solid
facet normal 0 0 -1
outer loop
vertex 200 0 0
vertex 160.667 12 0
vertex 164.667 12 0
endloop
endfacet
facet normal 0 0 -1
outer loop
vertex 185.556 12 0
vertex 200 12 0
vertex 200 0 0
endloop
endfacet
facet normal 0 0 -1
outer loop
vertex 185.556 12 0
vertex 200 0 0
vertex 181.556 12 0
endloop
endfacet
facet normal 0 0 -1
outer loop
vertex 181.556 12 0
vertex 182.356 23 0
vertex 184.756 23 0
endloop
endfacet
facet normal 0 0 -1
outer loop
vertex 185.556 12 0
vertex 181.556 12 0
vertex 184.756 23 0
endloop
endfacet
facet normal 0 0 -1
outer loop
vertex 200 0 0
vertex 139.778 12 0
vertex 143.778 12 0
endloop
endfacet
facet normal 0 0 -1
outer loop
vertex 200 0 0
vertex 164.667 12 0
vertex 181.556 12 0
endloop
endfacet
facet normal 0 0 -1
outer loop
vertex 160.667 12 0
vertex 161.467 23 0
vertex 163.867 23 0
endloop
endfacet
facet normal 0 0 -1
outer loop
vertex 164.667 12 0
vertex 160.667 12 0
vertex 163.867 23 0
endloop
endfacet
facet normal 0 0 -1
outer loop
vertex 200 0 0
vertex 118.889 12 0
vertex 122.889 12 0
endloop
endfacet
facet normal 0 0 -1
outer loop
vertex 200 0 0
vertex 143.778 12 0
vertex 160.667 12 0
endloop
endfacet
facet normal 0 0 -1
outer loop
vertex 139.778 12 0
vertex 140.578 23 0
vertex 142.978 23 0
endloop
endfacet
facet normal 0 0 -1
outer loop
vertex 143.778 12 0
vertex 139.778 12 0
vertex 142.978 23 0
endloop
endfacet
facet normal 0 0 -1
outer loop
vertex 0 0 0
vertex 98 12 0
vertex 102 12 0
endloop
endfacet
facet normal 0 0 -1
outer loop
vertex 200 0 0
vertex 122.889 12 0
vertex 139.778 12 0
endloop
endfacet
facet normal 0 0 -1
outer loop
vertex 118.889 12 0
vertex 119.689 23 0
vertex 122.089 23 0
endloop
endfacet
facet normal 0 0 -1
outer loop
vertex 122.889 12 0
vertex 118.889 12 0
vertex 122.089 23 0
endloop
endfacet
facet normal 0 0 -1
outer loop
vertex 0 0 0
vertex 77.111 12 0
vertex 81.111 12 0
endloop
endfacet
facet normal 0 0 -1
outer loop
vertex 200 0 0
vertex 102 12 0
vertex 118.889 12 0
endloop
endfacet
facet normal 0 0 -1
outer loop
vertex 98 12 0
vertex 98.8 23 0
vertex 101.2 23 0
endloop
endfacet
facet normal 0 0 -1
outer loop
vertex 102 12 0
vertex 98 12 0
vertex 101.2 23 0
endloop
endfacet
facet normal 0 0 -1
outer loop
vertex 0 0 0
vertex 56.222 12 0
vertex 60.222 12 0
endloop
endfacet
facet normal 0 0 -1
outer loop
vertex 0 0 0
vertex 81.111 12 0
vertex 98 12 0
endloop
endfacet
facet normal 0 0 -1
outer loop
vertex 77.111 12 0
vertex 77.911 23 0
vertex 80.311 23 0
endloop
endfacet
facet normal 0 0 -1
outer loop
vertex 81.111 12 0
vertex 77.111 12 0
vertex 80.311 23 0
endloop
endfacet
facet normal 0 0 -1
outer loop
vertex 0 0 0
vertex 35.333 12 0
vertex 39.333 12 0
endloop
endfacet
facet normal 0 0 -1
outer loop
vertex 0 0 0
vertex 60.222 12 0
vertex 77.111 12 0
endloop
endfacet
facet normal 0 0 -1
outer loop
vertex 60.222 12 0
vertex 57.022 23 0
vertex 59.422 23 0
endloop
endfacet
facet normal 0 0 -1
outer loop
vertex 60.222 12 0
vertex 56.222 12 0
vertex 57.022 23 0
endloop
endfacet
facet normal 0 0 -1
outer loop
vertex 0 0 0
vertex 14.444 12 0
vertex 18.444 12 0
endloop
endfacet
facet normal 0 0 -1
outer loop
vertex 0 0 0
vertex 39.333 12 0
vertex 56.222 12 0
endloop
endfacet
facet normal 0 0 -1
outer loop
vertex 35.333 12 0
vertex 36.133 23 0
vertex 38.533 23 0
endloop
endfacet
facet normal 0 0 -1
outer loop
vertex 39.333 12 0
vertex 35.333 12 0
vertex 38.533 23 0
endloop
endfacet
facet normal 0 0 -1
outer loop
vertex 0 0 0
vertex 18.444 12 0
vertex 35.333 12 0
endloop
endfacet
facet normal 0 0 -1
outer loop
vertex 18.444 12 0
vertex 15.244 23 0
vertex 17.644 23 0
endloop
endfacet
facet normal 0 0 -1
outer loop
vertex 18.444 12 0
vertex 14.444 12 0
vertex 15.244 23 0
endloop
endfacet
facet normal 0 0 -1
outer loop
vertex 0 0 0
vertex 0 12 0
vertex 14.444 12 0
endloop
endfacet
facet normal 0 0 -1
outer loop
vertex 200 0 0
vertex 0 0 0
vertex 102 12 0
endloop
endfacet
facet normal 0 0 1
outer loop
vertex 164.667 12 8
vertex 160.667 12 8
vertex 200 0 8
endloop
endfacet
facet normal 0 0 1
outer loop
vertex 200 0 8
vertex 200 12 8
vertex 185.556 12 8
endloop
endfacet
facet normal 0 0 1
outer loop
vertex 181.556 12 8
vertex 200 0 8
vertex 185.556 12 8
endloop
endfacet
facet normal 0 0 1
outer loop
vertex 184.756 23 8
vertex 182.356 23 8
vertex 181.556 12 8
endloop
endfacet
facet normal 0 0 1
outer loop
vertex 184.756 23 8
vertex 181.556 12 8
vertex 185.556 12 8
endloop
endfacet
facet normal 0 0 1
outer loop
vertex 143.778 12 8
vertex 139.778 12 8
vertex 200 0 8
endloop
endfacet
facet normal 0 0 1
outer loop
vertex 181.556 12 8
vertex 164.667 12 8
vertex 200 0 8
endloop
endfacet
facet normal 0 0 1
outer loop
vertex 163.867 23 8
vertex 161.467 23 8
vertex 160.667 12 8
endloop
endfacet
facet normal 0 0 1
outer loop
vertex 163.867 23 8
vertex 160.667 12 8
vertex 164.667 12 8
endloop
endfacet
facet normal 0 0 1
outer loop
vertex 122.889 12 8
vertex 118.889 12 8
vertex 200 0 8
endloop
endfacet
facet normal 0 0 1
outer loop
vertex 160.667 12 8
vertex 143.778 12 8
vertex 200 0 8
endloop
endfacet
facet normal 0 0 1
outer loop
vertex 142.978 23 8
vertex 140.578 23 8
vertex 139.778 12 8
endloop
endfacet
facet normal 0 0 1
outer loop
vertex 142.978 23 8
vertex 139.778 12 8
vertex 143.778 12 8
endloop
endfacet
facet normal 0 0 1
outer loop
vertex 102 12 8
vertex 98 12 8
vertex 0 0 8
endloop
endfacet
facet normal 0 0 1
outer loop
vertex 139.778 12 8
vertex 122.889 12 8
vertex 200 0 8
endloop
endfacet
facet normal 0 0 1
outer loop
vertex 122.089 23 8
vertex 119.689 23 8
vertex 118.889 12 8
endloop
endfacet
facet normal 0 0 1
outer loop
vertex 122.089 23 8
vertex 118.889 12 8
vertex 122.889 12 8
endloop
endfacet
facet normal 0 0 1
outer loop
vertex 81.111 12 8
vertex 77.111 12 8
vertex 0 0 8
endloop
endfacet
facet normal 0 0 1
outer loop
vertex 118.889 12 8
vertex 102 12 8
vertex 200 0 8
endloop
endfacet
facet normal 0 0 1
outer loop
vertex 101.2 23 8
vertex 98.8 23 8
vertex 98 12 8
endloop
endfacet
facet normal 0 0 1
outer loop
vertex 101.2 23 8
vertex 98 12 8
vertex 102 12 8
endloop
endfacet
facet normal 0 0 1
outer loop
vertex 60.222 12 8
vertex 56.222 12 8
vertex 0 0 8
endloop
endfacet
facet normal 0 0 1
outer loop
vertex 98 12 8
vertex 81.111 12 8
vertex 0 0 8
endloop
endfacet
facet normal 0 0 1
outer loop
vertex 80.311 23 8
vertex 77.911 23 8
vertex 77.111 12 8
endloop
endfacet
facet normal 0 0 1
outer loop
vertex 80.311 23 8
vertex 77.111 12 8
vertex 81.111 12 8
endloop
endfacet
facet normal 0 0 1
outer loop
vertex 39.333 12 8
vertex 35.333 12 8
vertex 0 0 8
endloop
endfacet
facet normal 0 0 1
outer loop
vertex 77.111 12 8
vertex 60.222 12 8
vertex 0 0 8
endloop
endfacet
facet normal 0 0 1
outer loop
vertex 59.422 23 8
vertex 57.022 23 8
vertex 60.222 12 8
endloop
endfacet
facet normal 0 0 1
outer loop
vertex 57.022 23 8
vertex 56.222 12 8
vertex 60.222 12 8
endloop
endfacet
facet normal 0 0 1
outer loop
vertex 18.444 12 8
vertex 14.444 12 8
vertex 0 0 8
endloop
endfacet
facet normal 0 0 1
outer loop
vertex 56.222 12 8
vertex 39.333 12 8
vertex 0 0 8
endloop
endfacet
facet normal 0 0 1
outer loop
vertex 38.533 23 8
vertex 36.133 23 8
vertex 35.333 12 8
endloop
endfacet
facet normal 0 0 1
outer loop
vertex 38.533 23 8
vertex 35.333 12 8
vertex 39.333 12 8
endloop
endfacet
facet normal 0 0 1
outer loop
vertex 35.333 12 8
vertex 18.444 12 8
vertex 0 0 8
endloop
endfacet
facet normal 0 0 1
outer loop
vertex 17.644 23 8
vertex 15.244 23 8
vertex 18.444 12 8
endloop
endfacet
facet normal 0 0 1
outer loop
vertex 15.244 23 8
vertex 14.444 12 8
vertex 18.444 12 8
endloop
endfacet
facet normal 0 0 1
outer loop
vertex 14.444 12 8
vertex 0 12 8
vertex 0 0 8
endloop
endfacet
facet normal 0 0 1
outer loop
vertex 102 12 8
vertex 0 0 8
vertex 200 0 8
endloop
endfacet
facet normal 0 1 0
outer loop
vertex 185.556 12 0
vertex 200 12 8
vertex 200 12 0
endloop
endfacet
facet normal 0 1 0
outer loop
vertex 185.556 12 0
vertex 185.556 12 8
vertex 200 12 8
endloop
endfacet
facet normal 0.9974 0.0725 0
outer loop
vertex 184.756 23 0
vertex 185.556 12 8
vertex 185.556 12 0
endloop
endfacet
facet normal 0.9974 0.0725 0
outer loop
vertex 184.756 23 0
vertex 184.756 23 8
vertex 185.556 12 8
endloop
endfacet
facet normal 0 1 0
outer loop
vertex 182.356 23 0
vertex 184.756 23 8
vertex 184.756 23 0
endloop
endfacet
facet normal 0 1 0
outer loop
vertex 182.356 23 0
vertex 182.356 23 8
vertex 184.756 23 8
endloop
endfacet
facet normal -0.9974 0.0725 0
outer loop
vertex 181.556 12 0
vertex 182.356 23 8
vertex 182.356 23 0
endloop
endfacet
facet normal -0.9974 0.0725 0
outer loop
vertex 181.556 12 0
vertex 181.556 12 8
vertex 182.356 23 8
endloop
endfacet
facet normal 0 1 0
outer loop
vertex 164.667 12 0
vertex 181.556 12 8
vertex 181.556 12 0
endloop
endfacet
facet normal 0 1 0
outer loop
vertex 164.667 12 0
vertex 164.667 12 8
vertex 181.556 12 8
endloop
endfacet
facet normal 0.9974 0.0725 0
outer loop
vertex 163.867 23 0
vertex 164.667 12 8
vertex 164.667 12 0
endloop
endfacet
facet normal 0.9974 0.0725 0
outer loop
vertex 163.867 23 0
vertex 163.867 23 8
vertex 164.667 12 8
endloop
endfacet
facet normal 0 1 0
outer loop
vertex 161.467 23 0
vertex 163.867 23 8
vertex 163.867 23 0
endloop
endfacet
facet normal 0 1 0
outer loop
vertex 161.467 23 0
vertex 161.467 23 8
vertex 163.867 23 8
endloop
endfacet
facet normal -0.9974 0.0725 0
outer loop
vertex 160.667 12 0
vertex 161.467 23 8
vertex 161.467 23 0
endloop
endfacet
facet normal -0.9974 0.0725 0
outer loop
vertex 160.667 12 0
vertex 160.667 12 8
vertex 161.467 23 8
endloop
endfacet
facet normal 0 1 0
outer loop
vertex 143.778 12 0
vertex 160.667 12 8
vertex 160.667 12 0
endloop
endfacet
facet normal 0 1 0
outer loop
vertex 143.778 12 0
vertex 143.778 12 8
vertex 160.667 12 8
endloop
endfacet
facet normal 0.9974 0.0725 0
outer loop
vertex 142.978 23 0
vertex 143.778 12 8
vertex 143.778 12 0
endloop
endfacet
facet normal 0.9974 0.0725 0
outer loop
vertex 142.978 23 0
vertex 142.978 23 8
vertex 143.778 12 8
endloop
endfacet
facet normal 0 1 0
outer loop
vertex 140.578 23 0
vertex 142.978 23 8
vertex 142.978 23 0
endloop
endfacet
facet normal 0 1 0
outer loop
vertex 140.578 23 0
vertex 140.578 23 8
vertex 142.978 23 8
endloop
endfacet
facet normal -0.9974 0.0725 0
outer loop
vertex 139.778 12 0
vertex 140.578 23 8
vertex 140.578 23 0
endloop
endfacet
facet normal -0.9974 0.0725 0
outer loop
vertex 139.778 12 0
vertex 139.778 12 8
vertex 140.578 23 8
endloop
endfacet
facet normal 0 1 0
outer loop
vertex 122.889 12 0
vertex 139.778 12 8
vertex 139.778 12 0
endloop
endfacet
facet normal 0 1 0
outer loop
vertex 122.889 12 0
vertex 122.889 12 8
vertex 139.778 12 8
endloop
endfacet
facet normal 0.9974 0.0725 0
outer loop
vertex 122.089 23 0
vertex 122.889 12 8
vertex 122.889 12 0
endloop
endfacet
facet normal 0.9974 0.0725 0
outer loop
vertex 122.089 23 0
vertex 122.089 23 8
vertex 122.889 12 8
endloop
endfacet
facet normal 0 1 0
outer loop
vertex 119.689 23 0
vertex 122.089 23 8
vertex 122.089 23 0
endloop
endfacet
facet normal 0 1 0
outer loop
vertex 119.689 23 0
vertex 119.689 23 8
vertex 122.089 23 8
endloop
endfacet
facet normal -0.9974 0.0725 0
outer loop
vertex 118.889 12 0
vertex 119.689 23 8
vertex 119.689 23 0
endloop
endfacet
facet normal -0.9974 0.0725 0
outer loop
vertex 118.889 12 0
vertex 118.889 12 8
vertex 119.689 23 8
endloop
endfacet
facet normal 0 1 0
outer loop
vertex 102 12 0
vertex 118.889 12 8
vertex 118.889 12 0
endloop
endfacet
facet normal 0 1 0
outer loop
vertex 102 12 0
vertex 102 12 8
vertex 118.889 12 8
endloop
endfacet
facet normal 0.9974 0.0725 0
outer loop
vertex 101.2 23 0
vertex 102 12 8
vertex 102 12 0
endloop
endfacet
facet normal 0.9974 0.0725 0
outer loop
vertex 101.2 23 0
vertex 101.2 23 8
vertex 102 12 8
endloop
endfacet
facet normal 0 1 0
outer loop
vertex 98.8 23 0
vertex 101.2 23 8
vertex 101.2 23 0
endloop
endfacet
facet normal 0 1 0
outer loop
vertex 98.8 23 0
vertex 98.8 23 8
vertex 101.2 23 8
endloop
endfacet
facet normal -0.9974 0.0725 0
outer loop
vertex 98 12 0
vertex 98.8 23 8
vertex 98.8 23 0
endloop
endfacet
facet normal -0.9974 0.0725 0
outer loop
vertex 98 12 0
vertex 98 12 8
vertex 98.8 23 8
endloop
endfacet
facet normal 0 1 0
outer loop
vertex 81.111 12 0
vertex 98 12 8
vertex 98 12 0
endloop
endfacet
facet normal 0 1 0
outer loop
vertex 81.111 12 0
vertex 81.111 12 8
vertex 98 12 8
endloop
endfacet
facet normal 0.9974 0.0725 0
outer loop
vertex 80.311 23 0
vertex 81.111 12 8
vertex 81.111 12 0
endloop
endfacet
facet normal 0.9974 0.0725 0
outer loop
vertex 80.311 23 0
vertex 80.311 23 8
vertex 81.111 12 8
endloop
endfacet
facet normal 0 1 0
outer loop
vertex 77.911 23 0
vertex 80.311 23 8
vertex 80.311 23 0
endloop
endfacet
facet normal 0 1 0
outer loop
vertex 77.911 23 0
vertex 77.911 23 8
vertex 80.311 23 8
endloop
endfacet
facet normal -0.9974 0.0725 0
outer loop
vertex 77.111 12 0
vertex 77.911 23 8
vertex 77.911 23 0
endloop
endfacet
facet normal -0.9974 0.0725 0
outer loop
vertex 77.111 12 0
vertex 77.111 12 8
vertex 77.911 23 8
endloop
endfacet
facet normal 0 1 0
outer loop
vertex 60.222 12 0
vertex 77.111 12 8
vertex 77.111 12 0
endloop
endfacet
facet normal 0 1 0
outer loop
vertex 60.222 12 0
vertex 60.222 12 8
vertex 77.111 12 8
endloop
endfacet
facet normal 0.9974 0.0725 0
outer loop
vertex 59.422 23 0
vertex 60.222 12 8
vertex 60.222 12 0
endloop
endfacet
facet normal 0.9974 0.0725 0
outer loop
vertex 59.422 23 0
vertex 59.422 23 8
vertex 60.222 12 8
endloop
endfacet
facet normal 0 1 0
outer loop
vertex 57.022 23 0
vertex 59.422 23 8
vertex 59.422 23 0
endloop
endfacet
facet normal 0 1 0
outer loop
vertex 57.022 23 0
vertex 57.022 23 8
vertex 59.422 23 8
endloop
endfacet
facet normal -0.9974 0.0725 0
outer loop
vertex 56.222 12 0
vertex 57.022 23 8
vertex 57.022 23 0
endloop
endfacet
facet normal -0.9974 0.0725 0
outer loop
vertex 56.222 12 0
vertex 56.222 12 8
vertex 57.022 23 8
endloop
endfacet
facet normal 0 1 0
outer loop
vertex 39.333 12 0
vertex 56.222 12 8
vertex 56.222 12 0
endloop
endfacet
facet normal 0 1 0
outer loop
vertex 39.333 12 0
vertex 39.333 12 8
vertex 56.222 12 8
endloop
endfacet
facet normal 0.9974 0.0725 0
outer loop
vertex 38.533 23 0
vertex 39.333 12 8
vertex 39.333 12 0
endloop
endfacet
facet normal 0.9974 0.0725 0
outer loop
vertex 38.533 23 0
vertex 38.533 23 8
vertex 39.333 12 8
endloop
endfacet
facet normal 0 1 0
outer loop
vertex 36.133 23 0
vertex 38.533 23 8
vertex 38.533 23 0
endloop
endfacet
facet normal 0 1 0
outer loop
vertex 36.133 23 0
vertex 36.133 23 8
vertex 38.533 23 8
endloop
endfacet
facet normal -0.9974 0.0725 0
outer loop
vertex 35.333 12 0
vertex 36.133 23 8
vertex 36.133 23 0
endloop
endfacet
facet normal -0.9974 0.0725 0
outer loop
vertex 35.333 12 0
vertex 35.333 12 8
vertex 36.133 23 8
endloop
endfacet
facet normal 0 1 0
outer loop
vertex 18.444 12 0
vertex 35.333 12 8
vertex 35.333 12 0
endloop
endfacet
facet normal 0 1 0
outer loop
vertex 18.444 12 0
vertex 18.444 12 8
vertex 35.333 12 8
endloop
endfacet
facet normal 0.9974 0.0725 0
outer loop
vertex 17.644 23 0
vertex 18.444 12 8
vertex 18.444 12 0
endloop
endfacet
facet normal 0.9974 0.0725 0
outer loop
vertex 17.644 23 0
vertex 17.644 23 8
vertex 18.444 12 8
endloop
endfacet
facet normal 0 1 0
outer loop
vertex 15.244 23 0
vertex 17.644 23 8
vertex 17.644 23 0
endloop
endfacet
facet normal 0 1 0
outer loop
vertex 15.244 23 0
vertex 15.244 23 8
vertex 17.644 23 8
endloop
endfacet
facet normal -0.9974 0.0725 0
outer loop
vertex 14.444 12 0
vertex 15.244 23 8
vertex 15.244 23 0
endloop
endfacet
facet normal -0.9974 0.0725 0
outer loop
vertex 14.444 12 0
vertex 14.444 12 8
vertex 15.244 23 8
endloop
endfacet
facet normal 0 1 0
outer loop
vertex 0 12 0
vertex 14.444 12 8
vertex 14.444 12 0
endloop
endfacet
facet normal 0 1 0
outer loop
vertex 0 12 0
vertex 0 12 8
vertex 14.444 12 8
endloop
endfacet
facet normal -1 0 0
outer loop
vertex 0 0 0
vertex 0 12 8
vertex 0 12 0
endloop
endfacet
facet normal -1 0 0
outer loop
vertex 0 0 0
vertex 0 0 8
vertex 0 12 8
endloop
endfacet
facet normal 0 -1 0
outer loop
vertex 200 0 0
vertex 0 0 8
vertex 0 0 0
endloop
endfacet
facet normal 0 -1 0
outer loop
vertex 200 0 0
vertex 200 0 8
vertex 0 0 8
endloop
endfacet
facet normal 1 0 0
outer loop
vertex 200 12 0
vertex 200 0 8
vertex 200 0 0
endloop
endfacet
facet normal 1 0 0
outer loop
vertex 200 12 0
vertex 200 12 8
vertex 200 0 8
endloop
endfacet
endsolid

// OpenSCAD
$fn = 32;

// ----------------------------------------------------------------------
// Gear rack: 9 teeth on a 200 mm bar, pitch 20.89 mm
// ----------------------------------------------------------------------

// --- parameters (mm) ---
profile_height = 8;       // extrusion height
profile_points = 40;      // points of the closed outline

profile = [[0, 0], [200, 0], [200, 12], [185.556, 12], [184.756, 23], [182.356, 23], [181.556, 12], [164.667, 12], [163.867, 23], [161.467, 23], [160.667, 12], [143.778, 12], [142.978, 23], [140.578, 23], [139.778, 12], [122.889, 12], [122.089, 23], [119.689, 23], [118.889, 12], [102, 12], [101.2, 23], [98.8, 23], [98, 12], [81.111, 12], [80.311, 23], [77.911, 23], [77.111, 12], [60.222, 12], [59.422, 23], [57.022, 23], [56.222, 12], [39.333, 12], [38.533, 23], [36.133, 23], [35.333, 12], [18.444, 12], [17.644, 23], [15.244, 23], [14.444, 12], [0, 12]];  // single closed polygon, 40 points, counter clockwise

// --- the one profile operation ---
linear_extrude(height = profile_height) polygon(points = profile);
